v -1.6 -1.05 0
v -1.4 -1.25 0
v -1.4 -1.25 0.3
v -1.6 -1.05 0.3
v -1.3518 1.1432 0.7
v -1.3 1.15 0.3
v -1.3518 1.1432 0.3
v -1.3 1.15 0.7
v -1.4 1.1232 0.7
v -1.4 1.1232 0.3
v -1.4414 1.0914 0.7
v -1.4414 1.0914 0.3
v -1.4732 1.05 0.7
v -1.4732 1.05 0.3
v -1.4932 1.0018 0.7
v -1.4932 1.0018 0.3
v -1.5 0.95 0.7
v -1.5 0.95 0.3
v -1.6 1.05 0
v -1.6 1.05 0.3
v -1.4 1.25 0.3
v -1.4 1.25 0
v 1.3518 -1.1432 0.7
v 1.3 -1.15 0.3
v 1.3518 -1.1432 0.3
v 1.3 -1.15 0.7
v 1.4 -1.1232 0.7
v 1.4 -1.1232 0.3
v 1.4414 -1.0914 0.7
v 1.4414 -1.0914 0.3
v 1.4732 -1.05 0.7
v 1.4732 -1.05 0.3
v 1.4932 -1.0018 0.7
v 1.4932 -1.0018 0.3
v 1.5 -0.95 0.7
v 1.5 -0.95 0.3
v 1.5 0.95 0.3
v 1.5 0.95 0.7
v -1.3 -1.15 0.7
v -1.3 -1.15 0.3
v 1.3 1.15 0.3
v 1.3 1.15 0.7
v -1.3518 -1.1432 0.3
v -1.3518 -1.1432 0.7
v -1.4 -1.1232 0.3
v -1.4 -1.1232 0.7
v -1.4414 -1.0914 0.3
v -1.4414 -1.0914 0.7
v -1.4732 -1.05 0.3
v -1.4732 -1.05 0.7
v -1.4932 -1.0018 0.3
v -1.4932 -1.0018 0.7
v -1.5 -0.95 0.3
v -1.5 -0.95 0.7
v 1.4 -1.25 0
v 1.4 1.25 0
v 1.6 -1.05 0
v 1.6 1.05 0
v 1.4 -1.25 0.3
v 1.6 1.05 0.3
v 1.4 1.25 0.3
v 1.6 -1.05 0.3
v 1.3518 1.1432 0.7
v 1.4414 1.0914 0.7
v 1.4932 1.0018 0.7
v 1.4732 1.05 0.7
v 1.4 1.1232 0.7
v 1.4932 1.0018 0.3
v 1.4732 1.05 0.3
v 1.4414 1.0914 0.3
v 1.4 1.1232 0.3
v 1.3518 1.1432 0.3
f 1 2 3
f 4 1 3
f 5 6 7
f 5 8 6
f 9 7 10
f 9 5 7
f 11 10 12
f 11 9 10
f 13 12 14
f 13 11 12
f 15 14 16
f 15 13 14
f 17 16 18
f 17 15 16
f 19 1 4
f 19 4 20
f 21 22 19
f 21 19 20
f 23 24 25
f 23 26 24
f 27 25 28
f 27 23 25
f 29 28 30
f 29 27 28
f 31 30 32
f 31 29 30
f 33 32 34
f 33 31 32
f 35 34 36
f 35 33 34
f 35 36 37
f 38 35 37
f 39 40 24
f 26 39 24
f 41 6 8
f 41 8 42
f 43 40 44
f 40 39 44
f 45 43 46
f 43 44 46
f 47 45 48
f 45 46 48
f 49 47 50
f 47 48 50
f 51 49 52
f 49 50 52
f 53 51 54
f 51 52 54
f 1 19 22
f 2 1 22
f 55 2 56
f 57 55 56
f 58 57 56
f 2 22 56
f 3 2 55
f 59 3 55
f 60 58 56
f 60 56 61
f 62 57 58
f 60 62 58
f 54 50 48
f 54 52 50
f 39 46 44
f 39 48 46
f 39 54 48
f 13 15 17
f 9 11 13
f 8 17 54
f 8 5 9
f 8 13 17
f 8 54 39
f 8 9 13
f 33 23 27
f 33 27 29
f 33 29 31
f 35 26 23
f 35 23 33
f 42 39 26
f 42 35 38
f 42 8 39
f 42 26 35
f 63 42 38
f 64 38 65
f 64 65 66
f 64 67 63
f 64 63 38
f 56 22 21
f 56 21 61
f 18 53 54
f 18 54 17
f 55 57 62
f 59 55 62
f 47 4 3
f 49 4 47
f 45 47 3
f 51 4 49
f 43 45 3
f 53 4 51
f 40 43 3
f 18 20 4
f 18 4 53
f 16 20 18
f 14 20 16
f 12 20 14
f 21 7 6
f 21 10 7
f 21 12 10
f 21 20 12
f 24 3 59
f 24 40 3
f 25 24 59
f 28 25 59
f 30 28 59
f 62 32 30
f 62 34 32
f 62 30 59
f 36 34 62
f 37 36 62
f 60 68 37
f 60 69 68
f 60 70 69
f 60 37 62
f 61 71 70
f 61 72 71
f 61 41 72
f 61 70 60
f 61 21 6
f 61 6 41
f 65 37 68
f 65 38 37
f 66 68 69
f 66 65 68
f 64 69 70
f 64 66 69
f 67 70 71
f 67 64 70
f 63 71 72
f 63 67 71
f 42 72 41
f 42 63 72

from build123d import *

# Parameters (mm, degrees)
F0_W     = 3.2
F0_H     = 2.5
F1_DEPTH = 0.3
F2_W     = 3
F2_H     = 2.3
F3_DEPTH = 0.4
F4_R     = 0.2
F5_SIZE  = 0.2


with BuildPart() as f1:
    # F0 (on Top) → F1 (new body)
    with BuildSketch(Plane.XY):
        Rectangle(F0_W, F0_H)
    extrude(amount=F1_DEPTH)

    # F2 (on face) → F3 (join)
    with BuildSketch(Plane.XY.offset(0.3)):
        Rectangle(F2_W, F2_H)
    extrude(amount=F3_DEPTH)

    # F4
    f4_edges = [f1.edges().sort_by_distance(p)[0] for p in [
        (1.5, 1.15, 0.5),
        (1.5, -1.15, 0.5),
        (-1.5, -1.15, 0.5),
        (-1.5, 1.15, 0.5),
    ]]
    fillet(f4_edges, radius=F4_R)

    # F5
    f5_edges = [f1.edges().sort_by_distance(p)[0] for p in [
        (-1.6, -1.25, 0.15),
        (-1.6, 1.25, 0.15),
        (1.6, -1.25, 0.15),
        (1.6, 1.25, 0.15),
    ]]
    chamfer(f5_edges, length=F5_SIZE)


solid = f1.part
